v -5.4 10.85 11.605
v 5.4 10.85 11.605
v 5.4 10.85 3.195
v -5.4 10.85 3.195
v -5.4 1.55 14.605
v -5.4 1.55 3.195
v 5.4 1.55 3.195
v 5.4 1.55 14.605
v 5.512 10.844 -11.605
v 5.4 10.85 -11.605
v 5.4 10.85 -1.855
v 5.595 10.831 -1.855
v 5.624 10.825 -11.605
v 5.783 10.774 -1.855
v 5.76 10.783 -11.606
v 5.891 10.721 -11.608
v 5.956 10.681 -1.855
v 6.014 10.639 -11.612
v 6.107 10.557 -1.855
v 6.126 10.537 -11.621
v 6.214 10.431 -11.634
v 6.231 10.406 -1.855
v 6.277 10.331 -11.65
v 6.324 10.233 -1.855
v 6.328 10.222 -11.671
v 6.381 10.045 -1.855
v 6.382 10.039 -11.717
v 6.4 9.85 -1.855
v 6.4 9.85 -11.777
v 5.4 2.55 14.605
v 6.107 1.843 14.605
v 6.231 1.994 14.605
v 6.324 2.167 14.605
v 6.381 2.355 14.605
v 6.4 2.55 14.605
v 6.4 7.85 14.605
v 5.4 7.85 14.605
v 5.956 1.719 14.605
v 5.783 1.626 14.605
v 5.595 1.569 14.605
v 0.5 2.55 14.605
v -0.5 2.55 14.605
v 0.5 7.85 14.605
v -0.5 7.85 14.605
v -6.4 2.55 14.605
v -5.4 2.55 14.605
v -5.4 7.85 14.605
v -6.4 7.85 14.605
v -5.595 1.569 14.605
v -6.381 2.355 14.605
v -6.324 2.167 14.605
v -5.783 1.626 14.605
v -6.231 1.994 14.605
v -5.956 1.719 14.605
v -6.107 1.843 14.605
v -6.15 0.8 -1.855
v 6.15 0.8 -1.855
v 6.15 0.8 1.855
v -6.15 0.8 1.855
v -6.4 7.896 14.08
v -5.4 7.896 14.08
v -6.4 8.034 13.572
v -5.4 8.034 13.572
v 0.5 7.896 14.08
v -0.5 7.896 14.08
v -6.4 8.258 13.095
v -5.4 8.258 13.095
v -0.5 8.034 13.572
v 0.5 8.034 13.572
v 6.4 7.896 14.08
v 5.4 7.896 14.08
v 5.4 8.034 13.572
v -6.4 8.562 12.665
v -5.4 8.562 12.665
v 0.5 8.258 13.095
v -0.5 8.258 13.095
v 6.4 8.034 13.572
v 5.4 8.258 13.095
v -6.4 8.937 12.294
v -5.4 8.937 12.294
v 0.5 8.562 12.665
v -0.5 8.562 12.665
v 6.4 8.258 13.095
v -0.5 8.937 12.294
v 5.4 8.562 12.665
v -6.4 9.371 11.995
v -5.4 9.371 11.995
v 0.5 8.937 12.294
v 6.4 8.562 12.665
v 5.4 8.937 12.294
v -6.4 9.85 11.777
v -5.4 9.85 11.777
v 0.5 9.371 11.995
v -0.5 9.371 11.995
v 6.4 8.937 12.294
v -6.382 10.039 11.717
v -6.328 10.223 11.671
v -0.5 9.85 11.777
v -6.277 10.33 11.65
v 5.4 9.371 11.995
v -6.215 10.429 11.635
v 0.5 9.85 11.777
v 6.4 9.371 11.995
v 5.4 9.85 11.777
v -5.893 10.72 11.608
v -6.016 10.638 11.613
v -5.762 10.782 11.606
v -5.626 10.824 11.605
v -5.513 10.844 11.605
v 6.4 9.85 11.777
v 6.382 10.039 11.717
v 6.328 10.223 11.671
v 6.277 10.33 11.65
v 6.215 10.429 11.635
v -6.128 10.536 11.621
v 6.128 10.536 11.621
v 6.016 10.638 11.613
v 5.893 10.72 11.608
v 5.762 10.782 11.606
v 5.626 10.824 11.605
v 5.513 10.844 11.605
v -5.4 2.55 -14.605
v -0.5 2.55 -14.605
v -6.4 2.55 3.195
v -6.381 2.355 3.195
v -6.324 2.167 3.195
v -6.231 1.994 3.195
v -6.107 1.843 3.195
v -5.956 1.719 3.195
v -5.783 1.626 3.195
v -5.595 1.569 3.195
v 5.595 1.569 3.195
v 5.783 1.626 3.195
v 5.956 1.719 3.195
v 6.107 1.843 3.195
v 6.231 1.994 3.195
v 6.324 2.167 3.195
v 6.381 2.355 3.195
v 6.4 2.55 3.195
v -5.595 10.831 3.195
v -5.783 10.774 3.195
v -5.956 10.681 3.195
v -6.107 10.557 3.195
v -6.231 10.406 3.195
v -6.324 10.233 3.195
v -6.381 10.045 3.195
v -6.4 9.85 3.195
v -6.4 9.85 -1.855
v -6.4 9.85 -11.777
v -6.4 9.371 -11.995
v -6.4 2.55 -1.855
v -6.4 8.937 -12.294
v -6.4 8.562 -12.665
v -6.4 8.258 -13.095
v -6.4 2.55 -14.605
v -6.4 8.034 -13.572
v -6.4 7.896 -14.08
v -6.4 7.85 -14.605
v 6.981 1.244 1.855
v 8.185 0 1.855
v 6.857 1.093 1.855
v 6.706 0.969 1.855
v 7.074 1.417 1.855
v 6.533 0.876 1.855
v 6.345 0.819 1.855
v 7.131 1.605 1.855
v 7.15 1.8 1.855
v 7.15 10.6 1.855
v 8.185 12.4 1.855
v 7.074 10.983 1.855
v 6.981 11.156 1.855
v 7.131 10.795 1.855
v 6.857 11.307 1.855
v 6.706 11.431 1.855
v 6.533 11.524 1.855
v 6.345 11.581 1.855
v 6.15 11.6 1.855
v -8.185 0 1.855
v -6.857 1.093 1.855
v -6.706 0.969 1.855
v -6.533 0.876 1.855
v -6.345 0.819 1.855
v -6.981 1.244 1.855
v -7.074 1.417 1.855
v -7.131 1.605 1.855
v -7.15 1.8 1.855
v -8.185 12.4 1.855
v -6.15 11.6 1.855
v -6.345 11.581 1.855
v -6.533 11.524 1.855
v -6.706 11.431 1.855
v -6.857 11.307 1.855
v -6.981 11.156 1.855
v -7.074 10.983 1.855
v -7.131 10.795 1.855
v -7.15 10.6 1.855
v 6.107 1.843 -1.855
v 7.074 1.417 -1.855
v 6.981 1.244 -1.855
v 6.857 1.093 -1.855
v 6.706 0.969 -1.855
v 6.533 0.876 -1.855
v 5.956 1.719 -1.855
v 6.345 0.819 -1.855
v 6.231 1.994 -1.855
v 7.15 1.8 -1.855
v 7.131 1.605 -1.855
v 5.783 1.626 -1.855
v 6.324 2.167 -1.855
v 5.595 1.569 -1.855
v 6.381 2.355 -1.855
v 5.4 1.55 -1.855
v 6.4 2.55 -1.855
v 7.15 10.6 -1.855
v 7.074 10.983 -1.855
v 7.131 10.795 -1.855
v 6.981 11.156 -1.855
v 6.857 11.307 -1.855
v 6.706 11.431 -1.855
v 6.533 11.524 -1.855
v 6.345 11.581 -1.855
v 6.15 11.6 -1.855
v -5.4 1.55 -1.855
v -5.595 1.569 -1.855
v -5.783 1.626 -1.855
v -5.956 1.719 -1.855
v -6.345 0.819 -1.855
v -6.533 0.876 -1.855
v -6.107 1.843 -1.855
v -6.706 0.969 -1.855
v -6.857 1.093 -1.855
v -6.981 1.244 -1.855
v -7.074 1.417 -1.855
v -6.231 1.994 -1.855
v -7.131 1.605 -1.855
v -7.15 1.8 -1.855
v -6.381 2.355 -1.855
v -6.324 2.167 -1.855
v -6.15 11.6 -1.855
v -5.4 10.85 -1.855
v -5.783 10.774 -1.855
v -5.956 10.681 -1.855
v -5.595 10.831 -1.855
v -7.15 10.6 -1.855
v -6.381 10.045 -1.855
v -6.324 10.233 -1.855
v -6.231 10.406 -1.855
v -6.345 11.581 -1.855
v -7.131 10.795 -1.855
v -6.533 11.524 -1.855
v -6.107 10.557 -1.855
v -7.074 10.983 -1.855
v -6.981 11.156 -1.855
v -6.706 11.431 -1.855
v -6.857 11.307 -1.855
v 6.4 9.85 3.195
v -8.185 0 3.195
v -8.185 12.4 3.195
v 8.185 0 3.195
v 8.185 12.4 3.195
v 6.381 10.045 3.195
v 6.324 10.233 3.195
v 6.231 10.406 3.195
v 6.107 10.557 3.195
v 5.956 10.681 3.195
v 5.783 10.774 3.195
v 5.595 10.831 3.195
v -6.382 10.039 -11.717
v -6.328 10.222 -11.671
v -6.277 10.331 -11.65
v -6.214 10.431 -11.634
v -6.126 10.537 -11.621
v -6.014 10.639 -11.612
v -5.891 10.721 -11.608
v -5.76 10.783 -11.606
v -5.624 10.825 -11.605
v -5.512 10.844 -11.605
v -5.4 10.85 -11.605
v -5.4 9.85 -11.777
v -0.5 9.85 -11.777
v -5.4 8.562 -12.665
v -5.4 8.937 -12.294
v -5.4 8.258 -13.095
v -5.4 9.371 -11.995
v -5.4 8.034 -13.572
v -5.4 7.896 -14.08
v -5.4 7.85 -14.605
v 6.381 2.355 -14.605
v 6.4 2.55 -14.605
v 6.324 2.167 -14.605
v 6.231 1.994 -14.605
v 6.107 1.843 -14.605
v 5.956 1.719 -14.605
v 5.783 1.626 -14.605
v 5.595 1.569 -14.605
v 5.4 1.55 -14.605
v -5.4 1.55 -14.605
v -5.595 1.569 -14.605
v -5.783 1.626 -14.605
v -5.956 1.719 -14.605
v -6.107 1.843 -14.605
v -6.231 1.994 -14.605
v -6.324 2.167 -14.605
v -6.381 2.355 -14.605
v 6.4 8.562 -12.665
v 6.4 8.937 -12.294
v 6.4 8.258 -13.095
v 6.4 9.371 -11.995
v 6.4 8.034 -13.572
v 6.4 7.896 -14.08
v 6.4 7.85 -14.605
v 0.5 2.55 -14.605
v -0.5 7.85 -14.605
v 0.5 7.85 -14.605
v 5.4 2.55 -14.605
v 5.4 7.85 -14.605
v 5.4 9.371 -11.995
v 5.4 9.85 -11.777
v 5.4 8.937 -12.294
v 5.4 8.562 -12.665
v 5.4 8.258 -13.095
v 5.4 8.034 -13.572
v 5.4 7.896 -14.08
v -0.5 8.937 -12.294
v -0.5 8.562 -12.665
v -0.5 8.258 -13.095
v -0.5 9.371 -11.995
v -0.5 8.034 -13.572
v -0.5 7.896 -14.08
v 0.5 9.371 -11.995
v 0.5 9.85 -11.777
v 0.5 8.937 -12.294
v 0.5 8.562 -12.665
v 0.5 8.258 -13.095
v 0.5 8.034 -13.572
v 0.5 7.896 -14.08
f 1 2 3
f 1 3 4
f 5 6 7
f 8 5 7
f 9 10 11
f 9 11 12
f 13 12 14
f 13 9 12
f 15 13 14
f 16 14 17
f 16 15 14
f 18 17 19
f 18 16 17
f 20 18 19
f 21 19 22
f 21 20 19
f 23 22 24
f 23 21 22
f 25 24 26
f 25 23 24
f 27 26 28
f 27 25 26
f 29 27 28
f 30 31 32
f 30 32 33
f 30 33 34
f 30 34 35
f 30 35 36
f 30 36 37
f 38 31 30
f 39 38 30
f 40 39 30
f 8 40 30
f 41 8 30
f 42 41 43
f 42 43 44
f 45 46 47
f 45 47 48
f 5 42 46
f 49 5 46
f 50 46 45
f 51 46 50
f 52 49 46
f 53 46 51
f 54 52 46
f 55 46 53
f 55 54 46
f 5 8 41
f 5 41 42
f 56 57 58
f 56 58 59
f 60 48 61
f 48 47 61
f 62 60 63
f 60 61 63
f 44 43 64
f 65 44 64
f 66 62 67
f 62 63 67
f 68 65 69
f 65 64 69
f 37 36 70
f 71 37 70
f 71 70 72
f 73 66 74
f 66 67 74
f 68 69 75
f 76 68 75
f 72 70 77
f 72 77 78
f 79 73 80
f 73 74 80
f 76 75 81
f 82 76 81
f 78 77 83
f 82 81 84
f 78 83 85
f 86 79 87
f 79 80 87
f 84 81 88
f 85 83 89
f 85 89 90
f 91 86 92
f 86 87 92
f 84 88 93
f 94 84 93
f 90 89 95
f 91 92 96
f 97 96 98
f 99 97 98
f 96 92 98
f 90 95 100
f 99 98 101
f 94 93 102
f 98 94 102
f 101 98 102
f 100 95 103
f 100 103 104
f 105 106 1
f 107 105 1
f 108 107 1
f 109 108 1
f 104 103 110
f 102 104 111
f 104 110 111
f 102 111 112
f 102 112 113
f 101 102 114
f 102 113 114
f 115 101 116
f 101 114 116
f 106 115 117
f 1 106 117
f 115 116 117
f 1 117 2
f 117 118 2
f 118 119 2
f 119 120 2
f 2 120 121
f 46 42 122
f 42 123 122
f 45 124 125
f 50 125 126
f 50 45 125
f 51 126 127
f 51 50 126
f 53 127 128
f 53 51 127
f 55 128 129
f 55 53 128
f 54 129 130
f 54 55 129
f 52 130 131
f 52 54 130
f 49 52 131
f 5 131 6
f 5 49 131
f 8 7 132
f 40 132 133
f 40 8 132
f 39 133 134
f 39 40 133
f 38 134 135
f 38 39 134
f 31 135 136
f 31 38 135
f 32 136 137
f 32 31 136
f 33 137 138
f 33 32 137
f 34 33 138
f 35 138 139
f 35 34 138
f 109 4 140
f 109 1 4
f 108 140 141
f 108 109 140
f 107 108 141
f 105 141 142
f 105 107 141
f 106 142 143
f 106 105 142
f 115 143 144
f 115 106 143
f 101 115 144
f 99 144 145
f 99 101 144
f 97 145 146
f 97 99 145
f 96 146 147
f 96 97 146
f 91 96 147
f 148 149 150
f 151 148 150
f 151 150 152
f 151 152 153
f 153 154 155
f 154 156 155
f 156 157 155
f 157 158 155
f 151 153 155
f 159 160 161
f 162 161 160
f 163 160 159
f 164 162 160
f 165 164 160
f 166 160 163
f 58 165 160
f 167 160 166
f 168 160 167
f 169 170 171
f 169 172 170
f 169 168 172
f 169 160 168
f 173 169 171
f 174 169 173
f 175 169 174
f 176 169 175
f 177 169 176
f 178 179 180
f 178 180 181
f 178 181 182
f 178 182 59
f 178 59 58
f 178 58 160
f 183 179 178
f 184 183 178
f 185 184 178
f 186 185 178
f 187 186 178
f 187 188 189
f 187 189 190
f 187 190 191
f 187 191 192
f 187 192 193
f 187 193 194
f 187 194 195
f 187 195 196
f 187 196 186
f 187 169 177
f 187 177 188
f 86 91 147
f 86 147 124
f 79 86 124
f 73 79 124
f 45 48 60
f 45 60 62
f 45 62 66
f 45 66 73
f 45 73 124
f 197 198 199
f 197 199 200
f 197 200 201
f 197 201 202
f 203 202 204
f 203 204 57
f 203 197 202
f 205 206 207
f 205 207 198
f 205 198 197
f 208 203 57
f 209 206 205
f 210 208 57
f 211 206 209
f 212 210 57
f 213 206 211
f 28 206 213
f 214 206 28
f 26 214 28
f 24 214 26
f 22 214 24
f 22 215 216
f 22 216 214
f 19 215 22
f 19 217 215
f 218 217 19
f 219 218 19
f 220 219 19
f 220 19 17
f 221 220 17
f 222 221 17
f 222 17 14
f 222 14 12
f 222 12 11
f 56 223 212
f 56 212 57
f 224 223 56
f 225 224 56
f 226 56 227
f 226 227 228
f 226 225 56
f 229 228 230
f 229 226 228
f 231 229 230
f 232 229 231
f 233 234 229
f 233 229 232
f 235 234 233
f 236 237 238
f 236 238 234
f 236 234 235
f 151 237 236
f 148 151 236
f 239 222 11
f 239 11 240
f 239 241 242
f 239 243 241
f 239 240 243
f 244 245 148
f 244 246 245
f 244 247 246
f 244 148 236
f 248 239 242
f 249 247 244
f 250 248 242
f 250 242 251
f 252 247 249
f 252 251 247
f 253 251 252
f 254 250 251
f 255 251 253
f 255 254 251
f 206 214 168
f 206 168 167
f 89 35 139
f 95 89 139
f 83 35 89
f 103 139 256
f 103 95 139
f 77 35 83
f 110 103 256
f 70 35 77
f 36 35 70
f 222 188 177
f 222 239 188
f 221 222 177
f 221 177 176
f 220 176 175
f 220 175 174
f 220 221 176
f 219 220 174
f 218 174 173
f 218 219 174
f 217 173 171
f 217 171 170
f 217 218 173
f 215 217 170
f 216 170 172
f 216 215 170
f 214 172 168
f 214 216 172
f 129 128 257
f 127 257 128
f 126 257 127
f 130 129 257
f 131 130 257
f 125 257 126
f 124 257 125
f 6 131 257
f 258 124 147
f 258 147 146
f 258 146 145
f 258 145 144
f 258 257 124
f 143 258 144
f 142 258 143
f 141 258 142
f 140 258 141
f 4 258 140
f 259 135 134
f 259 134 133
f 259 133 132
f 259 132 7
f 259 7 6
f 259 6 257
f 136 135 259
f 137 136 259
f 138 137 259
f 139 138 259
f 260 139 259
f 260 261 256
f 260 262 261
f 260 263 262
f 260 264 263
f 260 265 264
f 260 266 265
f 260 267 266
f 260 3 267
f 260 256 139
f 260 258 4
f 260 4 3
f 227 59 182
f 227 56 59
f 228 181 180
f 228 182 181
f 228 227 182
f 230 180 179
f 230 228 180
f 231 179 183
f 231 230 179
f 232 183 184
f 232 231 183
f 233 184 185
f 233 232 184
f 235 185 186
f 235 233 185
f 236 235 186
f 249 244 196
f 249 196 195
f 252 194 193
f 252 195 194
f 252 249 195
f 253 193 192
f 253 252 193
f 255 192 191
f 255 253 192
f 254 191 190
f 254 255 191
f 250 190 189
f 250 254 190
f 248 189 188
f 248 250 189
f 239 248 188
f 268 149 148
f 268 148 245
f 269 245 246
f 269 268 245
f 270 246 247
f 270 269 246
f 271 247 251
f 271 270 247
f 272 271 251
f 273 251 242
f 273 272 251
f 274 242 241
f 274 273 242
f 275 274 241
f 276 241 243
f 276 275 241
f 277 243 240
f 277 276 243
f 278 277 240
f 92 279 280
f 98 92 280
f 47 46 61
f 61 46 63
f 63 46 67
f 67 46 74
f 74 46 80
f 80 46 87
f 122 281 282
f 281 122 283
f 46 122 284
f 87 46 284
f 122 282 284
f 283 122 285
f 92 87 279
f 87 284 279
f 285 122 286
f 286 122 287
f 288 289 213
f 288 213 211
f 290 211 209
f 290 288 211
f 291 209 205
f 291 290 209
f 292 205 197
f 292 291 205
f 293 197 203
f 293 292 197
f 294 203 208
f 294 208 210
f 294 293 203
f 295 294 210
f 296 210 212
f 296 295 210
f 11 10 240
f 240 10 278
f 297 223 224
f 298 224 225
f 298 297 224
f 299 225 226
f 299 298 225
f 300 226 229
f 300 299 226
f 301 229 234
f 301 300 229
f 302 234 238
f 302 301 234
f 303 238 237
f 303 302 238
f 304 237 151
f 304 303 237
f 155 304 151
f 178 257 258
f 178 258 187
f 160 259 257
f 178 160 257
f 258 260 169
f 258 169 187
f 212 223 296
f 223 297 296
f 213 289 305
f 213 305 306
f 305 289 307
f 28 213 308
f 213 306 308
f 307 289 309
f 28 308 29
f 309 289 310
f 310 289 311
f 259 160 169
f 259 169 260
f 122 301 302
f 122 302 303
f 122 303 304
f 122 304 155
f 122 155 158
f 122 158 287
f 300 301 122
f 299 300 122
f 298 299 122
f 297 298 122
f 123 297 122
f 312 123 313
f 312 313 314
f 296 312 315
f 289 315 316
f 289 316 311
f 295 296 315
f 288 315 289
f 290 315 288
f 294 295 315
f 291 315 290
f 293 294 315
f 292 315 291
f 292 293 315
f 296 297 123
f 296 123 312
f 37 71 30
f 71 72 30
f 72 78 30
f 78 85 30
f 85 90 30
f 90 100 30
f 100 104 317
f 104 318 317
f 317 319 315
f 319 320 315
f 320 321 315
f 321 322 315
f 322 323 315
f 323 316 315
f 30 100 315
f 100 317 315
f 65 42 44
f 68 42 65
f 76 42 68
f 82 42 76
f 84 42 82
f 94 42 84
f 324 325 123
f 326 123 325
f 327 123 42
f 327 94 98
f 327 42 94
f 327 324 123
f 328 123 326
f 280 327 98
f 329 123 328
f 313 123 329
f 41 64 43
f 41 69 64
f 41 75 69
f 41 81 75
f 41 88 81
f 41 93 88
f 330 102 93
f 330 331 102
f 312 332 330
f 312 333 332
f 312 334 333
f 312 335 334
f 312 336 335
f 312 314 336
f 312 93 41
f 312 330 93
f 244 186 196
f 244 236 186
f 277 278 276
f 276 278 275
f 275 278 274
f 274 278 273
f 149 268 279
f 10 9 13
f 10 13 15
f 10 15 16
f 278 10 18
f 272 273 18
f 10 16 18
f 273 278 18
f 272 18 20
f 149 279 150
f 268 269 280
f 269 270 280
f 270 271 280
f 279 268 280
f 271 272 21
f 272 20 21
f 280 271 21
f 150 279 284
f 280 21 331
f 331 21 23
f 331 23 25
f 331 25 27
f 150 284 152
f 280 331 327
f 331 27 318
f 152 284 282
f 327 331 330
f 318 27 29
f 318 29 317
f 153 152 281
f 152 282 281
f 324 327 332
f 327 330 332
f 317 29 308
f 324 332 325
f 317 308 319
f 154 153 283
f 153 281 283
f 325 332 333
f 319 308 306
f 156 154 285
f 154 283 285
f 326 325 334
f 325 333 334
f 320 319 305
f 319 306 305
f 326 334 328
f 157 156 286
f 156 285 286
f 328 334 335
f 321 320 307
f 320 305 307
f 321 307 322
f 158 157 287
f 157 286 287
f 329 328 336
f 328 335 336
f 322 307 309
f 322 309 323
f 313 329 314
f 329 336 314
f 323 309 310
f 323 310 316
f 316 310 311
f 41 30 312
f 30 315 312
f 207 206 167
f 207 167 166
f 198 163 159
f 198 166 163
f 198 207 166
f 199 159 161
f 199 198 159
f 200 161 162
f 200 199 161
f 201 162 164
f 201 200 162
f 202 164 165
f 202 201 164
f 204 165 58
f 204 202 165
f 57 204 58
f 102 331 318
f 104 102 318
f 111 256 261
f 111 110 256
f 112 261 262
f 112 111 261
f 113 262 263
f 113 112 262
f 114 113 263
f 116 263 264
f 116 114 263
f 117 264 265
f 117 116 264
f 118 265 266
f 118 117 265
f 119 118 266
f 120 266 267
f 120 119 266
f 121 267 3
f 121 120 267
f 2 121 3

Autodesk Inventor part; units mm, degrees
ref_plane "YZ Plane" through (0, 0, 0) normal (1, 0, 0) x (0, 1, 0)
ref_plane "XZ Plane" through (0, 0, 0) normal (0, 1, 0) x (-1, 0, 0)
ref_plane "XY Plane" through (0, 0, 0) normal (0, 0, 1) x (1, 0, 0)
sketch "Sketch1" plane through (0, 0, 0) normal (0, 1, 0) x (-1, 0, 0)
  line L0 (-8.185, 14.605) -> (8.185, 14.605)
  line L1 (8.185, 14.605) -> (8.185, -14.605)
  line L2 (8.185, -14.605) -> (-8.185, -14.605)
  line L3 (-8.185, -14.605) -> (-8.185, 14.605)
  line L4 (-8.185, 14.605) -> (8.185, -14.605) construction
  line L5 (8.185, 14.605) -> (-8.185, -14.605) construction
  point P0 (0, 0)
  dimension "d0" = 16.37
  dimension "d1" = 29.21
extrude "Extrusion1" add sketch "Sketch1" along normal blind 12.4
sketch "Sketch2" plane through (-8.185, 0, 14.605) normal (0, 0, 1) x (1, 0, 0)
  line L0 (16.37, 0) -> (0, 0) projected
  line L1 (16.37, 0) -> (16.37, 12.4) projected
  line L2 (0, 12.4) -> (16.37, 12.4) projected
  line L3 (0, 0) -> (0, 12.4) projected
  line L4 (0, 12.4) -> (16.37, 12.4) projected
  line L5 (16.37, 12.4) -> (0, 0) construction
  line L6 (0, 12.4) -> (16.37, 0) construction
  line L7 (1.785, 1.55) -> (14.585, 1.55)
  line L8 (14.585, 1.55) -> (14.585, 10.85)
  line L9 (14.585, 10.85) -> (1.785, 10.85)
  line L10 (1.785, 10.85) -> (1.785, 1.55)
  line L11 (1.785, 1.55) -> (14.585, 10.85) construction
  line L12 (14.585, 1.55) -> (1.785, 10.85) construction
  point P0 (8.185, 0)
  point P1 (8.185, 6.2)
  dimension "d4" = 12.8
  dimension "d5" = 9.3
extrude "Extrusion2" cut sketch "Sketch2" against normal blind 11.41
sketch "Sketch3" plane through (8.185, 0, -14.605) normal (0, 0, -1) x (-1, 0, 0)
  line L0 (16.37, 0) -> (0, 0) projected
  line L1 (16.37, 0) -> (16.37, 12.4) projected
  line L2 (0, 12.4) -> (16.37, 12.4) projected
  line L3 (0, 0) -> (0, 12.4) projected
  line L4 (1.785, 10.85) -> (14.585, 10.85) projected
  line L5 (1.785, 1.55) -> (1.785, 10.85) projected
  line L6 (14.585, 1.55) -> (1.785, 1.55) projected
  line L7 (14.585, 10.85) -> (14.585, 1.55) projected
  line L8 (15.335, 11.6) -> (1.035, 11.6)
  line L9 (1.035, 11.6) -> (1.035, 0.8)
  line L10 (1.035, 0.8) -> (15.335, 0.8)
  line L11 (15.335, 0.8) -> (15.335, 11.6)
  point P0 (8.185, 0)
  dimension "d8" = 10.8
extrude "Extrusion3" cut sketch "Sketch3" against normal blind 16.46 contours L0 L3 L2 L1
sketch "Sketch4" plane through (7.15, 0.8, -14.605) normal (0, 0, -1) x (-1, 0, 0)
  line L0 (0.75, 10.05) -> (13.55, 10.05) projected
  line L1 (13.55, 10.05) -> (13.55, 0.75) projected
  line L2 (13.55, 0.75) -> (0.75, 0.75) projected
  line L3 (0.75, 0.75) -> (0.75, 10.05) projected
  line L4 (0, 10.8) -> (0, 0) projected
  line L5 (0, 0) -> (14.3, 0) projected
  line L6 (14.3, 0) -> (14.3, 10.8) projected
  line L7 (14.3, 10.8) -> (0, 10.8) projected
  point P0 (7.15, -0.8)
extrude "Extrusion4" cut sketch "Sketch4" against normal blind 12.75
sketch "Sketch5" plane through (6.4, 1.55, -14.605) normal (1, 0, 0) x (0, 0, -1)
  line L0 (-29.21, 0) -> (-29.21, 9.3) projected
  line L1 (-29.21, 0) -> (-17.8, 0) projected
  line L2 (-17.8, 0) -> (-17.8, 9.3) projected
  line L3 (-29.21, 9.3) -> (-17.8, 9.3) projected
  line L4 (0, 9.3) -> (0, 0) projected
  line L5 (0, 9.3) -> (-12.75, 9.3) projected
  line L6 (-12.75, 9.3) -> (-12.75, 0) projected
  line L7 (0, 0) -> (-12.75, 0) projected
  circle A0 centre (-29.21, 9.3) radius 3
  line L8 (0, 0) -> (0, 9.3) projected
  circle A1 centre (0, 9.3) radius 3
  point P0 (-14.605, -1.55)
  dimension "d13" = 6
  dimension "d14" = 6
extrude "Extrusion5" cut sketch "Sketch5" against normal through all contours A0 L3 L0 | L0 L3 A0 | L5 A1 L4 | L4 A1 L5
sketch "Sketch6" plane through (6.4, 1.55, -14.605) normal (0, 0, -1) x (-1, 0, 0)
  line L0 (0, 9.3) -> (12.8, 9.3) projected
  line L1 (0, 6.3) -> (0, 9.3) projected
  line L2 (0, 6.3) -> (0, 0) projected
  line L3 (12.8, 0) -> (12.8, 6.3) projected
  line L4 (12.8, 9.3) -> (12.8, 6.3) projected
  line L5 (0, 0) -> (12.8, 0) projected
  line L6 (11.8, 8.3) -> (1, 8.3)
  line L7 (1, 8.3) -> (1, 6.3)
  line L8 (1, 6.3) -> (1, 1)
  line L9 (1, 1) -> (11.8, 1)
  line L10 (11.8, 1) -> (11.8, 6.3)
  line L11 (11.8, 6.3) -> (11.8, 8.3)
  line L12 (1, 8.3) -> (11.8, 1) construction
  line L13 (1, 1) -> (11.8, 8.3) construction
  line L14 (5.9, 1) -> (6.9, 1)
  line L15 (6.9, 1) -> (6.9, 8.3)
  line L16 (6.9, 8.3) -> (5.9, 8.3)
  line L17 (5.9, 8.3) -> (5.9, 1)
  line L18 (5.9, 1) -> (6.9, 8.3) construction
  line L19 (6.9, 1) -> (5.9, 8.3) construction
  point P0 (6.4, -1.55)
  point P1 (6.4, 4.65)
  dimension "d17" = 1
  dimension "d18" = 1
extrude "Extrusion6" cut sketch "Sketch6" against normal through all contours L11 L10 L9 L15 L6 | L17 L9 L8 L7 L6
fillet "Fillet1" radius 1 12 edges at (7.15, 11.6, 0) (6.4, 10.85, -6.73) (-7.15, 11.6, 0) (-6.4, 10.85, -6.73) (6.4, 10.85, 7.4) (6.4, 1.55, 8.9) (6.4, 1.55, -8.23) (-6.4, 1.55, -8.23) (-7.15, 0.8, 0) (7.15, 0.8, 0) (-6.4, 1.55, 8.9) (-6.4, 10.85, 7.4)
properties part number "lcLcCoupler" material "Stainless Steel"
